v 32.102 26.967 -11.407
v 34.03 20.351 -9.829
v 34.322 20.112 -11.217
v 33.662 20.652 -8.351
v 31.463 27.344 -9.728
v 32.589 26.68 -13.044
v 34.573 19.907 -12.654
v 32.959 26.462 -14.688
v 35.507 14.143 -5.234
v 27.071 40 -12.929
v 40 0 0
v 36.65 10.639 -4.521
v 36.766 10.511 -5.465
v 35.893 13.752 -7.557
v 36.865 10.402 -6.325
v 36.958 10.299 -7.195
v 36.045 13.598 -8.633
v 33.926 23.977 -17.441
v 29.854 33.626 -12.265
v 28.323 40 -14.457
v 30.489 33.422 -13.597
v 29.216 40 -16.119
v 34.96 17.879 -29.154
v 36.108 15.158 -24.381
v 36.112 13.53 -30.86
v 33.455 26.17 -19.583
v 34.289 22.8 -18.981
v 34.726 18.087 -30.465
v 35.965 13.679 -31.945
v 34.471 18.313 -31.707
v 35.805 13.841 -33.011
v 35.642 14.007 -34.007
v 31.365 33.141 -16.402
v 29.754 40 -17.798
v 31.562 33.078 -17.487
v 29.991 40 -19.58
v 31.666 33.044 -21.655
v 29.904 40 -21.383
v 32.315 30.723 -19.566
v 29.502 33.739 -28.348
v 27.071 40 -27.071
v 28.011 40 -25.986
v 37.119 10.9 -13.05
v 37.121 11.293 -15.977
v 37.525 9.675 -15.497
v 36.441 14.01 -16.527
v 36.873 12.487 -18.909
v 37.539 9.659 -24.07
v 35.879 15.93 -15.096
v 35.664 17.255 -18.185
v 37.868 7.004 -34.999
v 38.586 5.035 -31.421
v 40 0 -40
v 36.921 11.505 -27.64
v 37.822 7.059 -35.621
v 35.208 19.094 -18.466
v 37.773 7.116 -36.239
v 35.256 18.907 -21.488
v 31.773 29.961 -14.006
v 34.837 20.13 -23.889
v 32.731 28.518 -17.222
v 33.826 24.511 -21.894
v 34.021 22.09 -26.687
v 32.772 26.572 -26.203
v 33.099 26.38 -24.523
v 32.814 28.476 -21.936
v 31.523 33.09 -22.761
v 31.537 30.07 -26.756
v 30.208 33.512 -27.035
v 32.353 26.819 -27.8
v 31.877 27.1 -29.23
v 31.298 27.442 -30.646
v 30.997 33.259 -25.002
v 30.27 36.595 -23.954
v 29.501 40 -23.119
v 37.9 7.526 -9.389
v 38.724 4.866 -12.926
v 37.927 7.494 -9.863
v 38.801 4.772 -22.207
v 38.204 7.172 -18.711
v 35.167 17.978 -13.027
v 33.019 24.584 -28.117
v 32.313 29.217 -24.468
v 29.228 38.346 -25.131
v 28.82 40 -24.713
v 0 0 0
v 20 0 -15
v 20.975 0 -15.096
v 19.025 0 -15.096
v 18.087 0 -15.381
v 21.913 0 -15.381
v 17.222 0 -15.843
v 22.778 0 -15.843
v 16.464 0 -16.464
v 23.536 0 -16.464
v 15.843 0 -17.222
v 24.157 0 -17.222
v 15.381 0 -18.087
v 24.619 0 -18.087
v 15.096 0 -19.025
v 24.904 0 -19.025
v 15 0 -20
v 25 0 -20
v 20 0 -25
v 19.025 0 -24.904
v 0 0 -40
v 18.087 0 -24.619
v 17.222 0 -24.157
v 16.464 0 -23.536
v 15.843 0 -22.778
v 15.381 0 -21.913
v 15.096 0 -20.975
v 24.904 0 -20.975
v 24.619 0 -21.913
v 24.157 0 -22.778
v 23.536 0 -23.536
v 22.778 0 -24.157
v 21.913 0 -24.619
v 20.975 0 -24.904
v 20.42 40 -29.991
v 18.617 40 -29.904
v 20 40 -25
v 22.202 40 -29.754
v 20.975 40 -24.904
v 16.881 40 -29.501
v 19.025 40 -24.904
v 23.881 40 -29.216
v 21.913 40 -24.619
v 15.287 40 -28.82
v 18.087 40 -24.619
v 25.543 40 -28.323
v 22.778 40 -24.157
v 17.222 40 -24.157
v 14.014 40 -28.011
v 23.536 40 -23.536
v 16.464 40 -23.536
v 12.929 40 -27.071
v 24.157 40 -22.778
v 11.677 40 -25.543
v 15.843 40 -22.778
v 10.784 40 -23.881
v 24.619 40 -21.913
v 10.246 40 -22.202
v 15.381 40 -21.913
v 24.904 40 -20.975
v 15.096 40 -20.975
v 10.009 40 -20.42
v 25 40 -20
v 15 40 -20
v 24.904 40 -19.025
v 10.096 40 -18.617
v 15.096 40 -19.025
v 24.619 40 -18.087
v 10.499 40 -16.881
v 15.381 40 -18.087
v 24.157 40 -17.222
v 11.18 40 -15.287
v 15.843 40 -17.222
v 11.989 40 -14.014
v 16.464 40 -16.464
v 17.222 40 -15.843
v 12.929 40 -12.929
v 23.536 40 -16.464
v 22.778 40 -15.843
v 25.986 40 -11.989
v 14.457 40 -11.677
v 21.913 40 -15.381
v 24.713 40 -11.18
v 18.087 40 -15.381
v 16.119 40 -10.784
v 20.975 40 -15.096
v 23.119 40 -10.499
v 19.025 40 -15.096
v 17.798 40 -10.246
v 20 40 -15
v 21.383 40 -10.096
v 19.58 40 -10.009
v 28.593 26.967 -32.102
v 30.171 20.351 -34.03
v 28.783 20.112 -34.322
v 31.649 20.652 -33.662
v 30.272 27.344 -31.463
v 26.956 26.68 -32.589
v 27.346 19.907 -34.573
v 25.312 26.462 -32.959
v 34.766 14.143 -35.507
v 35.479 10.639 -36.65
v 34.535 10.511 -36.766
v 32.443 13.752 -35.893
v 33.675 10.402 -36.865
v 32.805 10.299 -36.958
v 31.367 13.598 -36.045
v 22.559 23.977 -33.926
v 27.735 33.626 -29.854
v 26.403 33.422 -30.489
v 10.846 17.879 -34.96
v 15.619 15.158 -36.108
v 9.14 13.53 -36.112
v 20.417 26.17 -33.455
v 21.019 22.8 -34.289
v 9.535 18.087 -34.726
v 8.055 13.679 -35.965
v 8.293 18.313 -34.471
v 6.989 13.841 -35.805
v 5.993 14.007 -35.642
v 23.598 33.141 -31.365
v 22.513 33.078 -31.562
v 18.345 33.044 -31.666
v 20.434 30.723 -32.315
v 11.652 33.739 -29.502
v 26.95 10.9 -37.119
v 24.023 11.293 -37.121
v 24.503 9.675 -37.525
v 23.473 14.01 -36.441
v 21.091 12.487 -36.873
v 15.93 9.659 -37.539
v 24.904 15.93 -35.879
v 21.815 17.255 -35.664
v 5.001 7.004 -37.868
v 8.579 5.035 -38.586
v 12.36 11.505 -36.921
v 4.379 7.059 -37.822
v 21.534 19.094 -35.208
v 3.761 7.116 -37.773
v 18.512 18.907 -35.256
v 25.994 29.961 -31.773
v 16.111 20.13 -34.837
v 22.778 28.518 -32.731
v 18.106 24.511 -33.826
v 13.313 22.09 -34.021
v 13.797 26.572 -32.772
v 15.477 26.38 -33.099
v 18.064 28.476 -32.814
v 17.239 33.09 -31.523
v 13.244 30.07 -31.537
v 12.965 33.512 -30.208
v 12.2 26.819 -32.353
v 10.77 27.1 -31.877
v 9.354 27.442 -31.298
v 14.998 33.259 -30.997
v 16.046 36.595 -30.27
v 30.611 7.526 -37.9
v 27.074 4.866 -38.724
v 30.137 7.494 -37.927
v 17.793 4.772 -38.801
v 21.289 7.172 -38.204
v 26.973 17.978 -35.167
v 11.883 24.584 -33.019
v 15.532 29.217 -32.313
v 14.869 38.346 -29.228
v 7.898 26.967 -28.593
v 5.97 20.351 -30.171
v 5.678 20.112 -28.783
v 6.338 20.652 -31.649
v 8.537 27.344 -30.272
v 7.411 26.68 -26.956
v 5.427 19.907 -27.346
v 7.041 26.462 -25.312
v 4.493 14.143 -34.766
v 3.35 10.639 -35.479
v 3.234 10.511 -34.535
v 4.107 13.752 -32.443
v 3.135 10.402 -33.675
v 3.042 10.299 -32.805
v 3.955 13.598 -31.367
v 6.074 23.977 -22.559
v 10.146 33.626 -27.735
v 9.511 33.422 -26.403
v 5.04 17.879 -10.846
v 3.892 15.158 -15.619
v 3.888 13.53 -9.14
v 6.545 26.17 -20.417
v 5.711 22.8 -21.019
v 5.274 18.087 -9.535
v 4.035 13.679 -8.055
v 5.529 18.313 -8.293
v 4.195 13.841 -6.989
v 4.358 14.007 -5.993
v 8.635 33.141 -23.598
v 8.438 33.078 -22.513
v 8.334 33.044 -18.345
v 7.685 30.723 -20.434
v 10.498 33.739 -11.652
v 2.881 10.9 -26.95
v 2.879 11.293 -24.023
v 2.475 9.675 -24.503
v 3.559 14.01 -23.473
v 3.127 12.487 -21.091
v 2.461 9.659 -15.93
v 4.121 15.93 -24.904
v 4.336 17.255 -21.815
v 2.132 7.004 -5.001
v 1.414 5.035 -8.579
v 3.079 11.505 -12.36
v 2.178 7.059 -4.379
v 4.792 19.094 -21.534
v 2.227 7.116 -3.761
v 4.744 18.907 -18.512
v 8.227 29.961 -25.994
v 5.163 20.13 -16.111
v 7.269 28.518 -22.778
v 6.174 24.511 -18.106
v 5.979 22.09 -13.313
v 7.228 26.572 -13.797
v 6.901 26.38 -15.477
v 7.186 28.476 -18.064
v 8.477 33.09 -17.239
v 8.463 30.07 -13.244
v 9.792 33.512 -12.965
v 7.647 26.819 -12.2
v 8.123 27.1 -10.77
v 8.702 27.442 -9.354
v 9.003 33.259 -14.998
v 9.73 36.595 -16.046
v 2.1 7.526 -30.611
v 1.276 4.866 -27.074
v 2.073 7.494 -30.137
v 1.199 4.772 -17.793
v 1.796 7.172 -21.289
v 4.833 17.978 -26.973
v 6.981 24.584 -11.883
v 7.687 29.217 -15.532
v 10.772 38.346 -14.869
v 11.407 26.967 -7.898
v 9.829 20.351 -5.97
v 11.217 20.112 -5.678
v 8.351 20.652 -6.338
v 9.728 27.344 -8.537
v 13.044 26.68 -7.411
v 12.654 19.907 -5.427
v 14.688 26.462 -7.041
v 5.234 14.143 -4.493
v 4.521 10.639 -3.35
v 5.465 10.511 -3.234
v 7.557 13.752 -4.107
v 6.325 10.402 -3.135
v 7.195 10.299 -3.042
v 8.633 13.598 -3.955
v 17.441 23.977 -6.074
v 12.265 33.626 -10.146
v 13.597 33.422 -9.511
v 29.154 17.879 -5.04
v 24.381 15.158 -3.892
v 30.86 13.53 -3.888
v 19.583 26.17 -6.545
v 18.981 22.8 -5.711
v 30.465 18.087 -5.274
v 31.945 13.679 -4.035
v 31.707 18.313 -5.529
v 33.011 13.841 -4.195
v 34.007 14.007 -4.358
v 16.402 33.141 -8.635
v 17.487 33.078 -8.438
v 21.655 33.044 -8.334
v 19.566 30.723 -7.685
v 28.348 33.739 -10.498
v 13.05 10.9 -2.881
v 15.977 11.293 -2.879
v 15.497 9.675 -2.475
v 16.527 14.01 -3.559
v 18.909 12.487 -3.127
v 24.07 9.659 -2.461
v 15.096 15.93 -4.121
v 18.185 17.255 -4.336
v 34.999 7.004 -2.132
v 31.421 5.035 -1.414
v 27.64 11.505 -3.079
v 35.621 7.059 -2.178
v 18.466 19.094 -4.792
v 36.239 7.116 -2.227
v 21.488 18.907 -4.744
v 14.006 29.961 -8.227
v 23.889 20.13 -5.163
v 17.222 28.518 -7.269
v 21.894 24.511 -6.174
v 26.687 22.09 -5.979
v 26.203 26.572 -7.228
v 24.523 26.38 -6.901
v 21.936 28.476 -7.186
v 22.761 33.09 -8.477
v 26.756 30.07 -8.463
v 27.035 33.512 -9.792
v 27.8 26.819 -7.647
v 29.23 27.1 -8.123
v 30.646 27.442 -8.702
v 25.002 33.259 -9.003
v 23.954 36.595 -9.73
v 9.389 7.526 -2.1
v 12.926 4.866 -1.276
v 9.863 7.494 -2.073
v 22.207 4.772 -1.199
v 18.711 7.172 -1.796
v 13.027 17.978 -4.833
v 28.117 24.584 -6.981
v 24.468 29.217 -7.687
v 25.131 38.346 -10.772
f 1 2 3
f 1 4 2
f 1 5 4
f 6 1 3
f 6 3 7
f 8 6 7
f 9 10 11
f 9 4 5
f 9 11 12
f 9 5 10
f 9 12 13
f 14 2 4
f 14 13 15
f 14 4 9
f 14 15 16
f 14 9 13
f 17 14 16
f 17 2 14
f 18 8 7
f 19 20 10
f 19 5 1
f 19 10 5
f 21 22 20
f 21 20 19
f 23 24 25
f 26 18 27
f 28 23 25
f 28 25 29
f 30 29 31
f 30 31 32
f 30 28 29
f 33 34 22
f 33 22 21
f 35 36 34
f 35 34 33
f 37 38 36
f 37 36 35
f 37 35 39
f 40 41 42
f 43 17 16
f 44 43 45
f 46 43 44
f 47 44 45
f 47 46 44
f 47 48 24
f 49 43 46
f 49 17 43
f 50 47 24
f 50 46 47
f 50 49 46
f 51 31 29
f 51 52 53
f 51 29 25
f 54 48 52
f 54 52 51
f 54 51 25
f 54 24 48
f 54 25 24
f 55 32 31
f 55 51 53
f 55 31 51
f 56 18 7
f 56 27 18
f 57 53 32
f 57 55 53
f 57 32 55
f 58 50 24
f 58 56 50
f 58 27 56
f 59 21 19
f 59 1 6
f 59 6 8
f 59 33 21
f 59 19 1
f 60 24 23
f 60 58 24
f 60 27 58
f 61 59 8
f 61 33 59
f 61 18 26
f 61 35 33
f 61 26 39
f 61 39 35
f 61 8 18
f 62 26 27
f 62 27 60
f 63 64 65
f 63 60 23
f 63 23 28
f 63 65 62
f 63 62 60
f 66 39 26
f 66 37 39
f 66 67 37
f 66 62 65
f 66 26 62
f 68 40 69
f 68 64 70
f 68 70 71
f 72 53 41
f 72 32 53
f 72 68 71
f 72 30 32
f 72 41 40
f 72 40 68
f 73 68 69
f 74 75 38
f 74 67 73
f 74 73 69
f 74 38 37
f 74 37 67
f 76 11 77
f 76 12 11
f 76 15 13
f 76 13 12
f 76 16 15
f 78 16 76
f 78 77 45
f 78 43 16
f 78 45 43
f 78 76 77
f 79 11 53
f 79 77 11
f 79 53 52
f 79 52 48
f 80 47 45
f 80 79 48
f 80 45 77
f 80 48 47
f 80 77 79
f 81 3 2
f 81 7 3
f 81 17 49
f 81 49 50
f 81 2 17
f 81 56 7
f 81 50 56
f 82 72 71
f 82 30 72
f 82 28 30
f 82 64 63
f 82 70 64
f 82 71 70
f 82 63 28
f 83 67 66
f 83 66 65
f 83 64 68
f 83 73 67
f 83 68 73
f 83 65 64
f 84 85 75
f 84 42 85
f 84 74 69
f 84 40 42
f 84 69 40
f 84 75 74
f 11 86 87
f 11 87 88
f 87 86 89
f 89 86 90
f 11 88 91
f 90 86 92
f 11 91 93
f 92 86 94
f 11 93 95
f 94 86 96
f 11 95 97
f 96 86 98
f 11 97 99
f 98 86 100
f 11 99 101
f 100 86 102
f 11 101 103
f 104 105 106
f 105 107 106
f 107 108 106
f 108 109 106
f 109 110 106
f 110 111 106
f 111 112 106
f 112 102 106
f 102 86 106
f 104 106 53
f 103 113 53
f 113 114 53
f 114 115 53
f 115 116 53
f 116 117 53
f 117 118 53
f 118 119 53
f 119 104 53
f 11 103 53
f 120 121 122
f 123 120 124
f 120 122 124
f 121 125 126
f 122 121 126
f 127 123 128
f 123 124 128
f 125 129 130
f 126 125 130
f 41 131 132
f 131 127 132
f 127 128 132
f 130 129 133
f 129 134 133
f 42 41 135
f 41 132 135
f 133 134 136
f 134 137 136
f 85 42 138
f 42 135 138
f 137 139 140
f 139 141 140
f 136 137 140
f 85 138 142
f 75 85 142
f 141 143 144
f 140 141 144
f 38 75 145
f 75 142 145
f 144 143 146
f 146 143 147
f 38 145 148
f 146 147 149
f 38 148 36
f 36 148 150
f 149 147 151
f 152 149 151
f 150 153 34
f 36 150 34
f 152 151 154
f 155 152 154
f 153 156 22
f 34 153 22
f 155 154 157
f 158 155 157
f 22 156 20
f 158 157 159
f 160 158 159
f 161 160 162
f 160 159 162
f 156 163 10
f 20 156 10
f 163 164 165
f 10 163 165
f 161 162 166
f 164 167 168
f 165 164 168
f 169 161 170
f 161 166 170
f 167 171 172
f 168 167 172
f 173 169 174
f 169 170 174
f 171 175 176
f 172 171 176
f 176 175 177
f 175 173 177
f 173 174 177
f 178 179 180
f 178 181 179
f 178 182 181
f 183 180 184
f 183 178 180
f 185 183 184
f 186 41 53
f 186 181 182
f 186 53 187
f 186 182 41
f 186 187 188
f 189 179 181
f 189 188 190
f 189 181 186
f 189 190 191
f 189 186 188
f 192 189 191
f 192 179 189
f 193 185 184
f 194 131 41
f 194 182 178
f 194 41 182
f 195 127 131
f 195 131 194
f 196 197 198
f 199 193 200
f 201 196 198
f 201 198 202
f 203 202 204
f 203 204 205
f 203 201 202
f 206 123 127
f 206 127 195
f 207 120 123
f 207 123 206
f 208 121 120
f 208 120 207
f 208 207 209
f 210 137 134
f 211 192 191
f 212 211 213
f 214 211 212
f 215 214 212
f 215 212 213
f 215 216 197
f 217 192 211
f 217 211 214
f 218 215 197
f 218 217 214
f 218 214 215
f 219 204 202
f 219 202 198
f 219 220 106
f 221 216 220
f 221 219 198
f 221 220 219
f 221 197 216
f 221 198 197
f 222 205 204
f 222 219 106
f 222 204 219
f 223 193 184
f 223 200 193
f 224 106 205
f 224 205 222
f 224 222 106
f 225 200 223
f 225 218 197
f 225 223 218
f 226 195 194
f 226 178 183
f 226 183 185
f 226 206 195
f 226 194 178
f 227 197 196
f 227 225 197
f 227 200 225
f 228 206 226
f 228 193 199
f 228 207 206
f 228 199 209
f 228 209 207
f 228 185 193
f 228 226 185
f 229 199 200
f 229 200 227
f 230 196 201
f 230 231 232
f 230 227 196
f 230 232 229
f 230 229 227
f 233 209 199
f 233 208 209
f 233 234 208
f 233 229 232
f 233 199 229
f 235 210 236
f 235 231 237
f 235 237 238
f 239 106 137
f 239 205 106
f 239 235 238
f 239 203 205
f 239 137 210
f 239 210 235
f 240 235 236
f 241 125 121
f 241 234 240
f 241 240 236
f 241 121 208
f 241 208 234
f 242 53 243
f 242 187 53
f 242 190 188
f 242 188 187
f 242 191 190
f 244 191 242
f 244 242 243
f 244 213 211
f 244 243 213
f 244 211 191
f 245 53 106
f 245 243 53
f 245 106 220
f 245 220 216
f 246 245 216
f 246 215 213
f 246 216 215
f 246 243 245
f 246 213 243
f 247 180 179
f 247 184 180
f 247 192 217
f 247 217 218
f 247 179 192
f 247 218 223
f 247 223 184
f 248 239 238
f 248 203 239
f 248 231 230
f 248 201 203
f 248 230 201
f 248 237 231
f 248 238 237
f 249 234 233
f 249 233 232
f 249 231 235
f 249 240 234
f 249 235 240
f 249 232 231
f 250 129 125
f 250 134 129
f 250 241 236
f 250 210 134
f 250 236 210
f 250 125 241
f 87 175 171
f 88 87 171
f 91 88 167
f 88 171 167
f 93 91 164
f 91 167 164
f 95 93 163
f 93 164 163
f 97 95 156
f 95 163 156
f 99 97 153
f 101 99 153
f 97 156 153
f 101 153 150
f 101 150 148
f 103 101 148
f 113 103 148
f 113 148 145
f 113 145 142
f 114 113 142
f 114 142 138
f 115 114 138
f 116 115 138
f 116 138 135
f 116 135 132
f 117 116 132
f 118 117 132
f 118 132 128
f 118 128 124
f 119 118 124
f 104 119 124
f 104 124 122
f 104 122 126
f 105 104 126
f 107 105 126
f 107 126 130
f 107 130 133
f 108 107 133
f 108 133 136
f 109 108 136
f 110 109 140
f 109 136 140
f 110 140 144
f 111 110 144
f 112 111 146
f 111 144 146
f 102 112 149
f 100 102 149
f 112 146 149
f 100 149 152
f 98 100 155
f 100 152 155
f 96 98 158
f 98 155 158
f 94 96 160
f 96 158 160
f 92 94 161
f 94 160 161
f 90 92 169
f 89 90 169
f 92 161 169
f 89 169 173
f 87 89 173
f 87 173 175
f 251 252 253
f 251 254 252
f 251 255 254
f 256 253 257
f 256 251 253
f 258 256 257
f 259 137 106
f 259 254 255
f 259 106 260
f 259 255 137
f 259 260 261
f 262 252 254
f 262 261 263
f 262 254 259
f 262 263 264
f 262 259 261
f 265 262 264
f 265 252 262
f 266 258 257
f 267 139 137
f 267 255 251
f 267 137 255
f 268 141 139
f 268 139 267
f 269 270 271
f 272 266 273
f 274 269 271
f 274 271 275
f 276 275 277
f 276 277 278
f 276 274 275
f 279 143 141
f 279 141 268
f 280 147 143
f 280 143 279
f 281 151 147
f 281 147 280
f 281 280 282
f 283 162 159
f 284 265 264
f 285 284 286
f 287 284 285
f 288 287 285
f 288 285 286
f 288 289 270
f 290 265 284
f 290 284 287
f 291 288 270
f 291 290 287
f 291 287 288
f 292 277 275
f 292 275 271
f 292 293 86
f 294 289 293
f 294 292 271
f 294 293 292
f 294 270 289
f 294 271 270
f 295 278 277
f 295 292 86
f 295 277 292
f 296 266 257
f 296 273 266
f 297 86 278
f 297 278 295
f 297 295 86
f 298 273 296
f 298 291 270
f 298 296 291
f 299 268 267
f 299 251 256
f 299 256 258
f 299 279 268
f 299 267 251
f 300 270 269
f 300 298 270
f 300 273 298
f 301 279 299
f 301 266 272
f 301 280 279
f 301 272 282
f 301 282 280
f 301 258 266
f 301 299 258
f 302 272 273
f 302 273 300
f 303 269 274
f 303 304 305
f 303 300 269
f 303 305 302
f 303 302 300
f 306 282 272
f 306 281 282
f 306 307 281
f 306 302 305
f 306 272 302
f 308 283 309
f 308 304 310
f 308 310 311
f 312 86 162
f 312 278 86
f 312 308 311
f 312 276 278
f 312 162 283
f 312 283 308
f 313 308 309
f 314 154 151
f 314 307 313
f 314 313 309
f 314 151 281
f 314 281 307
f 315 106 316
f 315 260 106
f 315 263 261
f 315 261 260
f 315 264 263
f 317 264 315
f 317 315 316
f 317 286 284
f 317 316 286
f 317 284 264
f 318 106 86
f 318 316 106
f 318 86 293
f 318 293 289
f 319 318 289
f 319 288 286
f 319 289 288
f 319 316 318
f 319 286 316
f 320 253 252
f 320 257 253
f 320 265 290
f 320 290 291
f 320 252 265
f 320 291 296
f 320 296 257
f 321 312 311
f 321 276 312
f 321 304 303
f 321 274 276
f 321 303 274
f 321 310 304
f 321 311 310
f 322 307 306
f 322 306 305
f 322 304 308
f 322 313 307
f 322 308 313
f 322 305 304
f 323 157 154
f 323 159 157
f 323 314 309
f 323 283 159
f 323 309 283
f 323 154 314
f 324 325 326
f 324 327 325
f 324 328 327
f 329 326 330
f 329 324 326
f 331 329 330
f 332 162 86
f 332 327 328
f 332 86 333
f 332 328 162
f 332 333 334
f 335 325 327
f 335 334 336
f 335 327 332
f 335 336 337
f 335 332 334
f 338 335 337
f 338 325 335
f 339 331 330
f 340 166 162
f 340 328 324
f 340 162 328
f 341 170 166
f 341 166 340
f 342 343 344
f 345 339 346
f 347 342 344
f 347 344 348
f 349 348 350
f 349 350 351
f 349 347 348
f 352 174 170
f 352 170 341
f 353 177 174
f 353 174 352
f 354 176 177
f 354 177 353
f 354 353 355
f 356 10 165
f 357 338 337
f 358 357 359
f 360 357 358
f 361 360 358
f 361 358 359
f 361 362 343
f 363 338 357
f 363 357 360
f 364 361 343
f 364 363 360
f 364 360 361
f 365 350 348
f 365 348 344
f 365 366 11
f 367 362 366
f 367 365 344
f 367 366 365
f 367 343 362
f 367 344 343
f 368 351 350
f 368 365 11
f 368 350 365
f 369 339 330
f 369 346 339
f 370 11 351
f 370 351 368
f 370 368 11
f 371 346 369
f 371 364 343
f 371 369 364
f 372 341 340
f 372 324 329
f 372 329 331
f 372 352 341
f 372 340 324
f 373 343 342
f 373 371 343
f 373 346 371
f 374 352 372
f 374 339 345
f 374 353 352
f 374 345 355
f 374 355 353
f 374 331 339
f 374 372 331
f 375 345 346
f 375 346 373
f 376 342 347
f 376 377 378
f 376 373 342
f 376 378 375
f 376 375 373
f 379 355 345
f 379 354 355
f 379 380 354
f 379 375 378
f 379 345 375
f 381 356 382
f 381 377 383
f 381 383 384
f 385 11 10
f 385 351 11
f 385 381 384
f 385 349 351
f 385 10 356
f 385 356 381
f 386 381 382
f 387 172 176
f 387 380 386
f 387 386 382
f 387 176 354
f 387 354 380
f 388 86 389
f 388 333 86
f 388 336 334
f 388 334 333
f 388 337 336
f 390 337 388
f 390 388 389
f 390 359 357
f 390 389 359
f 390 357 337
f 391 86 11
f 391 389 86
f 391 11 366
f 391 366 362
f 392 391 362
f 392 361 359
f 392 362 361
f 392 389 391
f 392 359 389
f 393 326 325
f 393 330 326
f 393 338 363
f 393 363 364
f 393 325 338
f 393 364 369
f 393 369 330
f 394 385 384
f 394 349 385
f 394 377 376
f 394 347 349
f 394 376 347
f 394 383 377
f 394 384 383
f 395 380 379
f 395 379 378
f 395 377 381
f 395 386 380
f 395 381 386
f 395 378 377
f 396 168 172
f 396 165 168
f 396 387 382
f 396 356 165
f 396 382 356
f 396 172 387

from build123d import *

# Parameters (mm, degrees)
SKETCH1_W          = 40
SKETCH1_H          = 40
SKETCH3_R          = 5
CUT_EXTRUDE1_DEPTH = 70.282032476


with BuildPart() as part:
    # Sketch1 → Loft1 section 0
    with BuildSketch(Plane(origin=(0, 0, 0), x_dir=(1, 0, 0), z_dir=(0, 1, 0))):
        with Locations((20, 20)):
            Rectangle(SKETCH1_W, SKETCH1_H)
    # Sketch2 for Loft1 → Loft1 section 1
    with BuildSketch(Plane(origin=(0, 40, 0), x_dir=(1, 0, 0), z_dir=(0, 1, 0))):
        with BuildLine():
            # circular arc as an exact rational Bezier (weights 1, cos(half-angle), 1)
            Bezier((12.928932188, 12.928932188), (20, 5.857864377), (27.071067812, 12.928932188), weights=[1, 0.707106781, 1])
            Bezier((27.071067812, 12.928932188), (34.142135623, 20), (27.071067812, 27.071067812), weights=[1, 0.707106781, 1])
            Bezier((27.071067812, 27.071067812), (20, 34.142135623), (12.928932188, 27.071067812), weights=[1, 0.707106781, 1])
            Bezier((12.928932188, 27.071067812), (5.857864377, 20), (12.928932188, 12.928932188), weights=[1, 0.707106781, 1])
        make_face()
    loft()

    # Sketch3 → Cut-Extrude1 (cut, through all)
    with BuildSketch(Plane(origin=(0, 40, 0), x_dir=(1, 0, 0), z_dir=(0, 1, 0))):
        with Locations(Location((20, 20, 0), (0, 0, 270))):
            Circle(SKETCH3_R)
    extrude(amount=-CUT_EXTRUDE1_DEPTH, mode=Mode.SUBTRACT)


solid = part.part
